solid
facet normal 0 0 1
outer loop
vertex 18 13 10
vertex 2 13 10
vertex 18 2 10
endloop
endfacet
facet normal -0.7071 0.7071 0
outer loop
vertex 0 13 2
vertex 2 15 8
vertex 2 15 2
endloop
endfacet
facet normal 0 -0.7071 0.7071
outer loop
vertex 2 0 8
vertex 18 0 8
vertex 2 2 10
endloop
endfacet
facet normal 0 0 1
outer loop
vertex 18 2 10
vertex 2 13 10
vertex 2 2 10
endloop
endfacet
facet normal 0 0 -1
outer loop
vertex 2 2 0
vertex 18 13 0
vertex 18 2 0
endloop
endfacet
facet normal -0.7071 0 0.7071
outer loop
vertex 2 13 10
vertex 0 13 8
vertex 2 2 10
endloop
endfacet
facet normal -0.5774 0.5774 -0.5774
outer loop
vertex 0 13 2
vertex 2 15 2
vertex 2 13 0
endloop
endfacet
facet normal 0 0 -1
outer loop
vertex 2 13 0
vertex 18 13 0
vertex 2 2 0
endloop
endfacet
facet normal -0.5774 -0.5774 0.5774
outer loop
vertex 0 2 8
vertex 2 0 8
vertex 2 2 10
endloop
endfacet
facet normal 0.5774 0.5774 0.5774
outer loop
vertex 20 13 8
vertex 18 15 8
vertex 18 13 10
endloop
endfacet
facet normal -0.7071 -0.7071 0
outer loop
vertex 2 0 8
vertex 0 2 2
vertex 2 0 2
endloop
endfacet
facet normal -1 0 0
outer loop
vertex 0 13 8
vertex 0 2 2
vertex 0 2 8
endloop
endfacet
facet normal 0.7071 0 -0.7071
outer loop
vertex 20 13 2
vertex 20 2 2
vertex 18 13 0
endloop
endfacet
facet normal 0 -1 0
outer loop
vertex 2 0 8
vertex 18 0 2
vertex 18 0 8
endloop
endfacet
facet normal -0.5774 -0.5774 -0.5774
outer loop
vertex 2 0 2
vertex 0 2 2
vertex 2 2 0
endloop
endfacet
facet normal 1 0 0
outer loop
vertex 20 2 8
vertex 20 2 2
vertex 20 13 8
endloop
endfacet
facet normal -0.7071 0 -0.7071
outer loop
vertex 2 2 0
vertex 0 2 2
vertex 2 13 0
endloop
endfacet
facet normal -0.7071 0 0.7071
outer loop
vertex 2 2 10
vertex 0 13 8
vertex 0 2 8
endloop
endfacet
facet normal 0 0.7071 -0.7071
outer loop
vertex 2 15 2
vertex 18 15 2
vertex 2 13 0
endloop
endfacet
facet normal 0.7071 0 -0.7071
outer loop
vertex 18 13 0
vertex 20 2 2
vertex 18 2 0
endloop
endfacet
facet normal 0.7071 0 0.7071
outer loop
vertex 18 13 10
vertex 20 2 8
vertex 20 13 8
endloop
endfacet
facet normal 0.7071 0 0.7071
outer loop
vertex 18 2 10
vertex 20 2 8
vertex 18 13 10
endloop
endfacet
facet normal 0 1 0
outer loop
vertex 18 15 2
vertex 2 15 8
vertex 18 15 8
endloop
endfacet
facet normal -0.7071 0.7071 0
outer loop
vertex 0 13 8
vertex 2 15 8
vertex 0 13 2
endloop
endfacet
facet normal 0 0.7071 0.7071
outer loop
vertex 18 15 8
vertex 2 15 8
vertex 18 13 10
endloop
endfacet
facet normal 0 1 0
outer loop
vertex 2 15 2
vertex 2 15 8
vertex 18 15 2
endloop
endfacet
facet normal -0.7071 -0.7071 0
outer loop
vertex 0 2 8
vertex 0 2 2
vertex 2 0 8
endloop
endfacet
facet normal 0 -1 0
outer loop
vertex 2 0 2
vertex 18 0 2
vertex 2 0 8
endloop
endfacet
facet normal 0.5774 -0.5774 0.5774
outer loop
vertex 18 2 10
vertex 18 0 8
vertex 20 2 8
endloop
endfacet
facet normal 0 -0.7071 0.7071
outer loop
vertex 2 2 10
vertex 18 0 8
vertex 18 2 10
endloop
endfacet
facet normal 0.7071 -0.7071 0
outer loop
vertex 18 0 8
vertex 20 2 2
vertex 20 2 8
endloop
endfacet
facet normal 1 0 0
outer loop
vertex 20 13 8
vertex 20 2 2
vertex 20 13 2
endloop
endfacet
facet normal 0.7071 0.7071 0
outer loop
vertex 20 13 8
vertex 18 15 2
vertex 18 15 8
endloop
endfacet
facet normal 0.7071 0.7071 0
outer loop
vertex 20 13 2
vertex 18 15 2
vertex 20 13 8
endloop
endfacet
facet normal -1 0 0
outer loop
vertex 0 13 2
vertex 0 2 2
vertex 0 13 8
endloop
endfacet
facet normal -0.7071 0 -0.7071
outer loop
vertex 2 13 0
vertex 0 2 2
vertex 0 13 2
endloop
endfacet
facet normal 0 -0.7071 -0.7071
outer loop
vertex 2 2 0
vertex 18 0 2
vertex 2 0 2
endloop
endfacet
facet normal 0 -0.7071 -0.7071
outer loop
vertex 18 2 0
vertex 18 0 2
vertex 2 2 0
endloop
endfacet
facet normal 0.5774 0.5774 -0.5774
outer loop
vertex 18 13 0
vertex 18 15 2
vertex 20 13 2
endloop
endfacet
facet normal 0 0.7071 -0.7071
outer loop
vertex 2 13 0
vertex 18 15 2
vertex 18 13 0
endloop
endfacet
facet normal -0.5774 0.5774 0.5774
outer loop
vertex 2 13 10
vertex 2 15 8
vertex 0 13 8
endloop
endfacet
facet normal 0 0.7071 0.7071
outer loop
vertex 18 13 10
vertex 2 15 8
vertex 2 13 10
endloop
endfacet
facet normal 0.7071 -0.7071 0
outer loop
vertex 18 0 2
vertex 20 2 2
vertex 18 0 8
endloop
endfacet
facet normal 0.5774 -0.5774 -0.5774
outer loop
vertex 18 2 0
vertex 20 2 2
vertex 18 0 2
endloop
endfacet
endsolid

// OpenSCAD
// Simplified cuboid with chamfer (BOSL-inspired)
module simple_cuboid(size = [10, 10, 10], chamfer = 0) {
    if (chamfer > 0) {
        hull() {
            translate([chamfer, chamfer, 0])
                cube([size[0] - 2*chamfer, size[1] - 2*chamfer, size[2]]);
            translate([0, chamfer, chamfer])
                cube([size[0], size[1] - 2*chamfer, size[2] - 2*chamfer]);
            translate([chamfer, 0, chamfer])
                cube([size[0] - 2*chamfer, size[1], size[2] - 2*chamfer]);
        }
    } else {
        cube(size);
    }
}

simple_cuboid([20, 15, 10], chamfer = 2);
